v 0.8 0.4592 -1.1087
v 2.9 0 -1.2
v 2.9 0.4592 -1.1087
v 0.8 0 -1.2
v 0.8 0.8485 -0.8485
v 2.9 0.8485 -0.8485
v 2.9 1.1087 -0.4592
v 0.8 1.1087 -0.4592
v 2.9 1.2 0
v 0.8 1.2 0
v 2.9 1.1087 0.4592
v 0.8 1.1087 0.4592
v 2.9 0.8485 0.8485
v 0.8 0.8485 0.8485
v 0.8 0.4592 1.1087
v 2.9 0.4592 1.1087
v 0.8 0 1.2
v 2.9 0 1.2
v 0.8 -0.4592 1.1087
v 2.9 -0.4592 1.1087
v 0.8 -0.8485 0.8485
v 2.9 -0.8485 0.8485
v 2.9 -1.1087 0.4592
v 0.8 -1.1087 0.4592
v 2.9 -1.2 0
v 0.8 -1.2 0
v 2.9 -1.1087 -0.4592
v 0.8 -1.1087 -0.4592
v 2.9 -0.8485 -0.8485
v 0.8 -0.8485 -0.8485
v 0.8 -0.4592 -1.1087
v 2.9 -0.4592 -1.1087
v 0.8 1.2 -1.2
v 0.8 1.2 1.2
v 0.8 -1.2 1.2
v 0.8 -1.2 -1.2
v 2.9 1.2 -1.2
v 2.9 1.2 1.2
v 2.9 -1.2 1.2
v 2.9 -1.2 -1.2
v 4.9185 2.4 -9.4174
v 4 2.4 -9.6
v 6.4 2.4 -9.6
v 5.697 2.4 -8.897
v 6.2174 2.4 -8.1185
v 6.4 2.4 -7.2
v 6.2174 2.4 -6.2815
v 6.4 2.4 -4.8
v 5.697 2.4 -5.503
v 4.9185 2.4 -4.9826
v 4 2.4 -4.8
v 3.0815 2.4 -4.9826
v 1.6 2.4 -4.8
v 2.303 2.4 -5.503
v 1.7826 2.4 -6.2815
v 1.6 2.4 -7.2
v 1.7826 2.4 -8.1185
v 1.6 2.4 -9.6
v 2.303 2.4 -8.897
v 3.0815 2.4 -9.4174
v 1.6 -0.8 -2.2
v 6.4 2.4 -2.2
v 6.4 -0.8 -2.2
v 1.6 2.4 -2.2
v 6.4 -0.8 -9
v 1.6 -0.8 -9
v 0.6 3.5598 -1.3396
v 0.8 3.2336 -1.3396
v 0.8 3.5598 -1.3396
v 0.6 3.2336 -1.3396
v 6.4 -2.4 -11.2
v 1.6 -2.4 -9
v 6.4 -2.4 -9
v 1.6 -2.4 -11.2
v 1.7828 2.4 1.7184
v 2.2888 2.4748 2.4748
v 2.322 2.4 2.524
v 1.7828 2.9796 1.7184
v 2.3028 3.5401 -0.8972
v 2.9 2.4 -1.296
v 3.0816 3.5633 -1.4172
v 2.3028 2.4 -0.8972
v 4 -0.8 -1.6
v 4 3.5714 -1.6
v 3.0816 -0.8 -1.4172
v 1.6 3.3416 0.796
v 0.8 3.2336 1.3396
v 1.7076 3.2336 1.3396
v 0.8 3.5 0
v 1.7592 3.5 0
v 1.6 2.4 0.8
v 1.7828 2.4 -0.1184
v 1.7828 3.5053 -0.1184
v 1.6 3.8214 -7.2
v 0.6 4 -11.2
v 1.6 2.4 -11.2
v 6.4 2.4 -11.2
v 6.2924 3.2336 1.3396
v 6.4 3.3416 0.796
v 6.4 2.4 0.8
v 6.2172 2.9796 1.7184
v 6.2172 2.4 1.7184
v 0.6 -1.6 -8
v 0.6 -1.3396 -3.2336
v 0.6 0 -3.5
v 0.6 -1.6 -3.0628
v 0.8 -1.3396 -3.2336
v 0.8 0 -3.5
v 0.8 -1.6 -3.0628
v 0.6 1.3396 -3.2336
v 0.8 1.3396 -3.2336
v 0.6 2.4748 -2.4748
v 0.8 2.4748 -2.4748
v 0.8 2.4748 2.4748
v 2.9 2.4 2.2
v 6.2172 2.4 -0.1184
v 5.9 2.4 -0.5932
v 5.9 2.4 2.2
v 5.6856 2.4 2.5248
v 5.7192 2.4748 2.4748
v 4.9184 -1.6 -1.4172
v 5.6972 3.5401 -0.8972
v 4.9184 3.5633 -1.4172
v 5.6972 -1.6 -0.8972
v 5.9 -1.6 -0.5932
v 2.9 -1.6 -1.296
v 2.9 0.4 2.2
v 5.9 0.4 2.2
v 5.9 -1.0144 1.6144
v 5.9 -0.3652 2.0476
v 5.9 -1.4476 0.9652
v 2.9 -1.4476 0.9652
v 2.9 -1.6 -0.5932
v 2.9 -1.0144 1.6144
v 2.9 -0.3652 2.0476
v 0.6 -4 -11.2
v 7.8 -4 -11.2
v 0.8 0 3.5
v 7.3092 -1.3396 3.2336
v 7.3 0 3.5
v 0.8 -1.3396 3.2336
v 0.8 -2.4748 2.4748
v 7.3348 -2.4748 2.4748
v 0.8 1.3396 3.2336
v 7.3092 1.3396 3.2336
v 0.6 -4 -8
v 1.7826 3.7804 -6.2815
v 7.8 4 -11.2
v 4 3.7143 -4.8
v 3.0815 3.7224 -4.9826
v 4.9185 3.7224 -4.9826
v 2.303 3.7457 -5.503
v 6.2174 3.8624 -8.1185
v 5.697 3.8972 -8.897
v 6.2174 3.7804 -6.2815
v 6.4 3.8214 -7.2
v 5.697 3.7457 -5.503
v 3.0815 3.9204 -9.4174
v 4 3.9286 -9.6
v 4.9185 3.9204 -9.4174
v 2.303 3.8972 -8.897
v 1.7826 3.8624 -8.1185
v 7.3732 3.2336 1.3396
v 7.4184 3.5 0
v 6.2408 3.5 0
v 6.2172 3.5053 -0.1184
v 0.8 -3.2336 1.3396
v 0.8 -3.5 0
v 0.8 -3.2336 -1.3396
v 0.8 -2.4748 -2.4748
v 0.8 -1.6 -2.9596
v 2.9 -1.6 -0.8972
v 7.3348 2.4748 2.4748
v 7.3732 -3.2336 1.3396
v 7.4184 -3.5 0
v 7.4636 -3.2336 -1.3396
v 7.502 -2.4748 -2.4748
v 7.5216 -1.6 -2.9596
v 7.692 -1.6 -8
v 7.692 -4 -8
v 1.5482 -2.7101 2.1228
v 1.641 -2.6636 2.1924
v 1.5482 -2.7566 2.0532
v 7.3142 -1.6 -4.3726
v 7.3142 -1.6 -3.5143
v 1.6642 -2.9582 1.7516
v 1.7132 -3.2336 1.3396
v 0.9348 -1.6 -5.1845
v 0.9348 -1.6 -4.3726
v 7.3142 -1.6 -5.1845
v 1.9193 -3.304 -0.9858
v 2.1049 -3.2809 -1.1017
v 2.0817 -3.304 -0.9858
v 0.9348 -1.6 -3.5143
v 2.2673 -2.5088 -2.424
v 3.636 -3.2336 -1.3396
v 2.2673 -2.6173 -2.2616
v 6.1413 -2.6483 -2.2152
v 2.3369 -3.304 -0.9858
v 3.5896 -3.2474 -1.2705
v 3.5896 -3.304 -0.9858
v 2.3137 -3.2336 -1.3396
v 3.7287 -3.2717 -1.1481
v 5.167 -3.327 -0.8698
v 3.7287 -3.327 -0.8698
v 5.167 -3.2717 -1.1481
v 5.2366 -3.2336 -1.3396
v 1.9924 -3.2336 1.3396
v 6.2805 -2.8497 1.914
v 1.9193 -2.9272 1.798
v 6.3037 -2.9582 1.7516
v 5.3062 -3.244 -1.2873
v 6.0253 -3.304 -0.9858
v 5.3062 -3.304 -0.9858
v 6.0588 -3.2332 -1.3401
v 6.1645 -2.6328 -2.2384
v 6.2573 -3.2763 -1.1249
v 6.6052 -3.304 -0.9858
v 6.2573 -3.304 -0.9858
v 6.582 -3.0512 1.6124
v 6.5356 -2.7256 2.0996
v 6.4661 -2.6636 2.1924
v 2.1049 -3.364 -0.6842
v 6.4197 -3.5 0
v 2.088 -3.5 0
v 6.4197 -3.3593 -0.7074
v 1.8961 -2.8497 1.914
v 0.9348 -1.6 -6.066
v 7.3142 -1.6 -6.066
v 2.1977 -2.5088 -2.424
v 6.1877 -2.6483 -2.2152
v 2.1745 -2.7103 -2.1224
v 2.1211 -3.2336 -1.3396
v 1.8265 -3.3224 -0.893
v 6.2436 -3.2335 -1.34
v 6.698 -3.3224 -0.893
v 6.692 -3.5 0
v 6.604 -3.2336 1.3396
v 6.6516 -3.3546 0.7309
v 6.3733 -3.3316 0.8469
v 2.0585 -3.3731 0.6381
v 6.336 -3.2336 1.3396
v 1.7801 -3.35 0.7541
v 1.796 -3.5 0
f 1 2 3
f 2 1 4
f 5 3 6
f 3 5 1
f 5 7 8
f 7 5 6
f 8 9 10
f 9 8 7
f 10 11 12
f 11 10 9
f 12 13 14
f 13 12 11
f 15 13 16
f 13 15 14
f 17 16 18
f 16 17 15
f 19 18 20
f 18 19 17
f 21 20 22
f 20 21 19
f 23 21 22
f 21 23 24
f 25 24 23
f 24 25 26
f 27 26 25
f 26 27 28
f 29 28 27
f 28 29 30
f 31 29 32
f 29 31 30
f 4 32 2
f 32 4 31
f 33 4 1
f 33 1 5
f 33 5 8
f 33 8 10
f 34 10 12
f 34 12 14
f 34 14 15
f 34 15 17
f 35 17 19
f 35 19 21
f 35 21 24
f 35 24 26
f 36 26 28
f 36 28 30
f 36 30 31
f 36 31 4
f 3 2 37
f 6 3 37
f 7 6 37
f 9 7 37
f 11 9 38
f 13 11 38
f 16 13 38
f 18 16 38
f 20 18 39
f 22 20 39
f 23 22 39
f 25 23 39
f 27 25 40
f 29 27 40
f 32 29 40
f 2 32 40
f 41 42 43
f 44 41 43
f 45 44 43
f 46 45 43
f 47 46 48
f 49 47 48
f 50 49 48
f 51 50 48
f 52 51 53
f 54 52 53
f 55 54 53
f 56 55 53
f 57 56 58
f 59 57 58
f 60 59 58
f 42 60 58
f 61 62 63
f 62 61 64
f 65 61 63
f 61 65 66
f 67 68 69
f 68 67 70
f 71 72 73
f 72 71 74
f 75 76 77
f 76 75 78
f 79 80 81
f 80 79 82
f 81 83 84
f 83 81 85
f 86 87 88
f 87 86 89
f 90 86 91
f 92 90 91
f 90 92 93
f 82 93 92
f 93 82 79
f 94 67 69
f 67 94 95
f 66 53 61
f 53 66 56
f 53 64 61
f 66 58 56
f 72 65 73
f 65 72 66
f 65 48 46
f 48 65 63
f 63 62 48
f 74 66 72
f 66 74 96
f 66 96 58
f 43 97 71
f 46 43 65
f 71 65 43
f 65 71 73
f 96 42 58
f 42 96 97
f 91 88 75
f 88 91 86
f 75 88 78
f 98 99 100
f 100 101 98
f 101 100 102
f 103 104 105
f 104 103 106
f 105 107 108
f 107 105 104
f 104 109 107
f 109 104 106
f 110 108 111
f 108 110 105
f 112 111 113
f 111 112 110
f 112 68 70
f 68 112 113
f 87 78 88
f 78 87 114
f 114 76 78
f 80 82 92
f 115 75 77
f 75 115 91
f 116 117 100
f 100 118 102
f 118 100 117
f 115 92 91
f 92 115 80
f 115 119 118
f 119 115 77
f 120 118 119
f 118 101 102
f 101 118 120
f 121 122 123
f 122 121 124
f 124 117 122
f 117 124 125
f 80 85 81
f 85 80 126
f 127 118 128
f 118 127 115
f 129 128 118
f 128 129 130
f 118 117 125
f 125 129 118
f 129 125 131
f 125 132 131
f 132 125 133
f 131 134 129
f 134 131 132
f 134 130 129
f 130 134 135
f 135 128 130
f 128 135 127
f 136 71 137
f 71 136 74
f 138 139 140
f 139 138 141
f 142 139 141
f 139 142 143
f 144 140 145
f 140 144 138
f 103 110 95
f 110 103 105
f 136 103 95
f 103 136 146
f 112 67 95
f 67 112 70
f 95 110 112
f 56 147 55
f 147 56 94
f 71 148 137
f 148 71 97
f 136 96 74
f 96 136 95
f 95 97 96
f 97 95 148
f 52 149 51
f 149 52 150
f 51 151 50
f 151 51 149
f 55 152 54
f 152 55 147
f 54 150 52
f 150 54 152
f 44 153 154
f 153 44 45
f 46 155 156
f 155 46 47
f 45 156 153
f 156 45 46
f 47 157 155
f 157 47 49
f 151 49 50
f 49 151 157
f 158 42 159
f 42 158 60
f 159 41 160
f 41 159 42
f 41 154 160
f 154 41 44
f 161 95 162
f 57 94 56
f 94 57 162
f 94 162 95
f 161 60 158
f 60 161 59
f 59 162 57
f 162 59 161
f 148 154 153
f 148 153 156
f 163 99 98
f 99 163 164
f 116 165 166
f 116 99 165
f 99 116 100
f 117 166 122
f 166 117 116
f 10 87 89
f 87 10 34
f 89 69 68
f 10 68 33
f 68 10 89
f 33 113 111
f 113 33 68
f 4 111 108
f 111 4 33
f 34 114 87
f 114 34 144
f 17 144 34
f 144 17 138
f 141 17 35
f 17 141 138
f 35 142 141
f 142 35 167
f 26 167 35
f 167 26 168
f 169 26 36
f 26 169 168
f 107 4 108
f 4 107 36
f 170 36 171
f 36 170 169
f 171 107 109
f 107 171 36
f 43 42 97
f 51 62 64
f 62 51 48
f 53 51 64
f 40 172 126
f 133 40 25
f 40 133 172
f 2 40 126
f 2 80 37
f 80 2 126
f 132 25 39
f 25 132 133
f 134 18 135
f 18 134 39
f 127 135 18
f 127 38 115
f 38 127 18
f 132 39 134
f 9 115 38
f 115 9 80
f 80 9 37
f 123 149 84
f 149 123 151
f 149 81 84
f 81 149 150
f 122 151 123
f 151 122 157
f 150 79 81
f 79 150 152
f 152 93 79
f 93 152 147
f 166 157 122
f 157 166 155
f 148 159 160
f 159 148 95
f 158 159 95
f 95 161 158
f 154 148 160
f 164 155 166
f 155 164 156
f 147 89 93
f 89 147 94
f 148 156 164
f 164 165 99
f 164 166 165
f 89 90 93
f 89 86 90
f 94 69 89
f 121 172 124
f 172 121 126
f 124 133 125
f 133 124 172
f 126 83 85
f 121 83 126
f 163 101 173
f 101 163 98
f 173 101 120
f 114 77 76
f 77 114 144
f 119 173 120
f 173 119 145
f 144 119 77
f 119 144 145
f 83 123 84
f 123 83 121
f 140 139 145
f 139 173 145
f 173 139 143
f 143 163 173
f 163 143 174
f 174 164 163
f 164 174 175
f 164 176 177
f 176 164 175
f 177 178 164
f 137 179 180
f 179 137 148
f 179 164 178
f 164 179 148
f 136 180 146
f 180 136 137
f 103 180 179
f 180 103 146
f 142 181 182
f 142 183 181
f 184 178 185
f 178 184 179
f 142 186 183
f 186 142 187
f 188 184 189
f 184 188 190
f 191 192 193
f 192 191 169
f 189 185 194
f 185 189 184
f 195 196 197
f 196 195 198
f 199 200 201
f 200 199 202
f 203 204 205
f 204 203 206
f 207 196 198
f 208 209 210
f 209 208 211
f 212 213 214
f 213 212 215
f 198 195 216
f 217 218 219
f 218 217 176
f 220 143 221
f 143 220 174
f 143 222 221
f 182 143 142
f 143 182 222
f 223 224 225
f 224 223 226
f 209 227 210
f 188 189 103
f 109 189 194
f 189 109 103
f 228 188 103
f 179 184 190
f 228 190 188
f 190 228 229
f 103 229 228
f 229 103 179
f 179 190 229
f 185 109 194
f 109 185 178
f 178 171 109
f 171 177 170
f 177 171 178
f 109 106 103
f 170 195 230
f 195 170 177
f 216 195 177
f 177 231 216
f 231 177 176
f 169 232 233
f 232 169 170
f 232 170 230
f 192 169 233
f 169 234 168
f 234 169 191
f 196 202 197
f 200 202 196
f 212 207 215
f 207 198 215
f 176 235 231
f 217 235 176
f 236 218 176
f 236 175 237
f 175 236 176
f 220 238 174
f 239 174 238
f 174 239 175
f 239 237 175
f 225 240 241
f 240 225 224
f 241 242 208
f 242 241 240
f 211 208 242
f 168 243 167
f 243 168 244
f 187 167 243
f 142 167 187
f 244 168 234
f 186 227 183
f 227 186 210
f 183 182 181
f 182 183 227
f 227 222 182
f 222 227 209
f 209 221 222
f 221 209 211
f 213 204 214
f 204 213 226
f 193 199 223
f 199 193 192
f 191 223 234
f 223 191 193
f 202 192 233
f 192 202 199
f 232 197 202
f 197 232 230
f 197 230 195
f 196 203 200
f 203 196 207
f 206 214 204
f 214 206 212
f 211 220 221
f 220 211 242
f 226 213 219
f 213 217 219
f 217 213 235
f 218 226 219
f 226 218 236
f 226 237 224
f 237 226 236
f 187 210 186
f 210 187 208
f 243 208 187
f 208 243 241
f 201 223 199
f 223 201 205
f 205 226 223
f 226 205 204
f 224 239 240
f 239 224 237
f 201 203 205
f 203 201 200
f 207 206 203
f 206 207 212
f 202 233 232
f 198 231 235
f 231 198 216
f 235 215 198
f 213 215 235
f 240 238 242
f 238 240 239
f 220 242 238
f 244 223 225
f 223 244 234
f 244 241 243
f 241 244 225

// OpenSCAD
use <../lib.scad>
use <s/3817bp70s01.scad>
use <s/3817bp70s02.scad>
function ldraw_lib__3817bp71() = [
// 0 ~Minifig Leg Left with Reflective Stripes and Tan Pocket Outline Pattern (Obsolete)
// 0 Name: 3817bp71.dat
// 0 Author: Philippe Hurbain [Philo]
// 0 !LDRAW_ORG Part UPDATE 2023-03
// 0 !LICENSE Licensed under CC BY 4.0 : see CAreadme.txt
// 
// 0 BFC CERTIFY CCW
  [0,"BFC","CERTIFY"],
  [0,"BFC","CCW"],
// 
// 0 !KEYWORDS Bricklink 970c00pb0160, Set 60321
// 
// 0 !HISTORY 2020-06-28 [PTadmin] Official Update 2020-01
// 0 !HISTORY 2023-05-03 [Holly-Wood] Obsoleted due to bad geometry
// 0 !HISTORY 2023-06-24 [OrionP] Official Update 2023-03
// 
// 
// 1 16 0 0 0 1 0 0 0 1 0 0 0 1 s\3817bp70s01.dat
  [1,16,0,0,0,1,0,0,0,1,0,0,0,1, ldraw_lib__s__3817bp70s01()],
// 1 19 0 0 0 1 0 0 0 1 0 0 0 1 s\3817bp70s02.dat
  [1,19,0,0,0,1,0,0,0,1,0,0,0,1, ldraw_lib__s__3817bp70s02()],
];
module ldraw_lib__3817bp71(step=0, col=false, unit=2/5, alt=false, line=0.2, solid=!$preview)
    makepoly(ldraw_lib__3817bp71(), step=step, col=col, unit=unit, alt=alt, line=line, solid=solid);
ldraw_lib__3817bp71(line=0.2);
